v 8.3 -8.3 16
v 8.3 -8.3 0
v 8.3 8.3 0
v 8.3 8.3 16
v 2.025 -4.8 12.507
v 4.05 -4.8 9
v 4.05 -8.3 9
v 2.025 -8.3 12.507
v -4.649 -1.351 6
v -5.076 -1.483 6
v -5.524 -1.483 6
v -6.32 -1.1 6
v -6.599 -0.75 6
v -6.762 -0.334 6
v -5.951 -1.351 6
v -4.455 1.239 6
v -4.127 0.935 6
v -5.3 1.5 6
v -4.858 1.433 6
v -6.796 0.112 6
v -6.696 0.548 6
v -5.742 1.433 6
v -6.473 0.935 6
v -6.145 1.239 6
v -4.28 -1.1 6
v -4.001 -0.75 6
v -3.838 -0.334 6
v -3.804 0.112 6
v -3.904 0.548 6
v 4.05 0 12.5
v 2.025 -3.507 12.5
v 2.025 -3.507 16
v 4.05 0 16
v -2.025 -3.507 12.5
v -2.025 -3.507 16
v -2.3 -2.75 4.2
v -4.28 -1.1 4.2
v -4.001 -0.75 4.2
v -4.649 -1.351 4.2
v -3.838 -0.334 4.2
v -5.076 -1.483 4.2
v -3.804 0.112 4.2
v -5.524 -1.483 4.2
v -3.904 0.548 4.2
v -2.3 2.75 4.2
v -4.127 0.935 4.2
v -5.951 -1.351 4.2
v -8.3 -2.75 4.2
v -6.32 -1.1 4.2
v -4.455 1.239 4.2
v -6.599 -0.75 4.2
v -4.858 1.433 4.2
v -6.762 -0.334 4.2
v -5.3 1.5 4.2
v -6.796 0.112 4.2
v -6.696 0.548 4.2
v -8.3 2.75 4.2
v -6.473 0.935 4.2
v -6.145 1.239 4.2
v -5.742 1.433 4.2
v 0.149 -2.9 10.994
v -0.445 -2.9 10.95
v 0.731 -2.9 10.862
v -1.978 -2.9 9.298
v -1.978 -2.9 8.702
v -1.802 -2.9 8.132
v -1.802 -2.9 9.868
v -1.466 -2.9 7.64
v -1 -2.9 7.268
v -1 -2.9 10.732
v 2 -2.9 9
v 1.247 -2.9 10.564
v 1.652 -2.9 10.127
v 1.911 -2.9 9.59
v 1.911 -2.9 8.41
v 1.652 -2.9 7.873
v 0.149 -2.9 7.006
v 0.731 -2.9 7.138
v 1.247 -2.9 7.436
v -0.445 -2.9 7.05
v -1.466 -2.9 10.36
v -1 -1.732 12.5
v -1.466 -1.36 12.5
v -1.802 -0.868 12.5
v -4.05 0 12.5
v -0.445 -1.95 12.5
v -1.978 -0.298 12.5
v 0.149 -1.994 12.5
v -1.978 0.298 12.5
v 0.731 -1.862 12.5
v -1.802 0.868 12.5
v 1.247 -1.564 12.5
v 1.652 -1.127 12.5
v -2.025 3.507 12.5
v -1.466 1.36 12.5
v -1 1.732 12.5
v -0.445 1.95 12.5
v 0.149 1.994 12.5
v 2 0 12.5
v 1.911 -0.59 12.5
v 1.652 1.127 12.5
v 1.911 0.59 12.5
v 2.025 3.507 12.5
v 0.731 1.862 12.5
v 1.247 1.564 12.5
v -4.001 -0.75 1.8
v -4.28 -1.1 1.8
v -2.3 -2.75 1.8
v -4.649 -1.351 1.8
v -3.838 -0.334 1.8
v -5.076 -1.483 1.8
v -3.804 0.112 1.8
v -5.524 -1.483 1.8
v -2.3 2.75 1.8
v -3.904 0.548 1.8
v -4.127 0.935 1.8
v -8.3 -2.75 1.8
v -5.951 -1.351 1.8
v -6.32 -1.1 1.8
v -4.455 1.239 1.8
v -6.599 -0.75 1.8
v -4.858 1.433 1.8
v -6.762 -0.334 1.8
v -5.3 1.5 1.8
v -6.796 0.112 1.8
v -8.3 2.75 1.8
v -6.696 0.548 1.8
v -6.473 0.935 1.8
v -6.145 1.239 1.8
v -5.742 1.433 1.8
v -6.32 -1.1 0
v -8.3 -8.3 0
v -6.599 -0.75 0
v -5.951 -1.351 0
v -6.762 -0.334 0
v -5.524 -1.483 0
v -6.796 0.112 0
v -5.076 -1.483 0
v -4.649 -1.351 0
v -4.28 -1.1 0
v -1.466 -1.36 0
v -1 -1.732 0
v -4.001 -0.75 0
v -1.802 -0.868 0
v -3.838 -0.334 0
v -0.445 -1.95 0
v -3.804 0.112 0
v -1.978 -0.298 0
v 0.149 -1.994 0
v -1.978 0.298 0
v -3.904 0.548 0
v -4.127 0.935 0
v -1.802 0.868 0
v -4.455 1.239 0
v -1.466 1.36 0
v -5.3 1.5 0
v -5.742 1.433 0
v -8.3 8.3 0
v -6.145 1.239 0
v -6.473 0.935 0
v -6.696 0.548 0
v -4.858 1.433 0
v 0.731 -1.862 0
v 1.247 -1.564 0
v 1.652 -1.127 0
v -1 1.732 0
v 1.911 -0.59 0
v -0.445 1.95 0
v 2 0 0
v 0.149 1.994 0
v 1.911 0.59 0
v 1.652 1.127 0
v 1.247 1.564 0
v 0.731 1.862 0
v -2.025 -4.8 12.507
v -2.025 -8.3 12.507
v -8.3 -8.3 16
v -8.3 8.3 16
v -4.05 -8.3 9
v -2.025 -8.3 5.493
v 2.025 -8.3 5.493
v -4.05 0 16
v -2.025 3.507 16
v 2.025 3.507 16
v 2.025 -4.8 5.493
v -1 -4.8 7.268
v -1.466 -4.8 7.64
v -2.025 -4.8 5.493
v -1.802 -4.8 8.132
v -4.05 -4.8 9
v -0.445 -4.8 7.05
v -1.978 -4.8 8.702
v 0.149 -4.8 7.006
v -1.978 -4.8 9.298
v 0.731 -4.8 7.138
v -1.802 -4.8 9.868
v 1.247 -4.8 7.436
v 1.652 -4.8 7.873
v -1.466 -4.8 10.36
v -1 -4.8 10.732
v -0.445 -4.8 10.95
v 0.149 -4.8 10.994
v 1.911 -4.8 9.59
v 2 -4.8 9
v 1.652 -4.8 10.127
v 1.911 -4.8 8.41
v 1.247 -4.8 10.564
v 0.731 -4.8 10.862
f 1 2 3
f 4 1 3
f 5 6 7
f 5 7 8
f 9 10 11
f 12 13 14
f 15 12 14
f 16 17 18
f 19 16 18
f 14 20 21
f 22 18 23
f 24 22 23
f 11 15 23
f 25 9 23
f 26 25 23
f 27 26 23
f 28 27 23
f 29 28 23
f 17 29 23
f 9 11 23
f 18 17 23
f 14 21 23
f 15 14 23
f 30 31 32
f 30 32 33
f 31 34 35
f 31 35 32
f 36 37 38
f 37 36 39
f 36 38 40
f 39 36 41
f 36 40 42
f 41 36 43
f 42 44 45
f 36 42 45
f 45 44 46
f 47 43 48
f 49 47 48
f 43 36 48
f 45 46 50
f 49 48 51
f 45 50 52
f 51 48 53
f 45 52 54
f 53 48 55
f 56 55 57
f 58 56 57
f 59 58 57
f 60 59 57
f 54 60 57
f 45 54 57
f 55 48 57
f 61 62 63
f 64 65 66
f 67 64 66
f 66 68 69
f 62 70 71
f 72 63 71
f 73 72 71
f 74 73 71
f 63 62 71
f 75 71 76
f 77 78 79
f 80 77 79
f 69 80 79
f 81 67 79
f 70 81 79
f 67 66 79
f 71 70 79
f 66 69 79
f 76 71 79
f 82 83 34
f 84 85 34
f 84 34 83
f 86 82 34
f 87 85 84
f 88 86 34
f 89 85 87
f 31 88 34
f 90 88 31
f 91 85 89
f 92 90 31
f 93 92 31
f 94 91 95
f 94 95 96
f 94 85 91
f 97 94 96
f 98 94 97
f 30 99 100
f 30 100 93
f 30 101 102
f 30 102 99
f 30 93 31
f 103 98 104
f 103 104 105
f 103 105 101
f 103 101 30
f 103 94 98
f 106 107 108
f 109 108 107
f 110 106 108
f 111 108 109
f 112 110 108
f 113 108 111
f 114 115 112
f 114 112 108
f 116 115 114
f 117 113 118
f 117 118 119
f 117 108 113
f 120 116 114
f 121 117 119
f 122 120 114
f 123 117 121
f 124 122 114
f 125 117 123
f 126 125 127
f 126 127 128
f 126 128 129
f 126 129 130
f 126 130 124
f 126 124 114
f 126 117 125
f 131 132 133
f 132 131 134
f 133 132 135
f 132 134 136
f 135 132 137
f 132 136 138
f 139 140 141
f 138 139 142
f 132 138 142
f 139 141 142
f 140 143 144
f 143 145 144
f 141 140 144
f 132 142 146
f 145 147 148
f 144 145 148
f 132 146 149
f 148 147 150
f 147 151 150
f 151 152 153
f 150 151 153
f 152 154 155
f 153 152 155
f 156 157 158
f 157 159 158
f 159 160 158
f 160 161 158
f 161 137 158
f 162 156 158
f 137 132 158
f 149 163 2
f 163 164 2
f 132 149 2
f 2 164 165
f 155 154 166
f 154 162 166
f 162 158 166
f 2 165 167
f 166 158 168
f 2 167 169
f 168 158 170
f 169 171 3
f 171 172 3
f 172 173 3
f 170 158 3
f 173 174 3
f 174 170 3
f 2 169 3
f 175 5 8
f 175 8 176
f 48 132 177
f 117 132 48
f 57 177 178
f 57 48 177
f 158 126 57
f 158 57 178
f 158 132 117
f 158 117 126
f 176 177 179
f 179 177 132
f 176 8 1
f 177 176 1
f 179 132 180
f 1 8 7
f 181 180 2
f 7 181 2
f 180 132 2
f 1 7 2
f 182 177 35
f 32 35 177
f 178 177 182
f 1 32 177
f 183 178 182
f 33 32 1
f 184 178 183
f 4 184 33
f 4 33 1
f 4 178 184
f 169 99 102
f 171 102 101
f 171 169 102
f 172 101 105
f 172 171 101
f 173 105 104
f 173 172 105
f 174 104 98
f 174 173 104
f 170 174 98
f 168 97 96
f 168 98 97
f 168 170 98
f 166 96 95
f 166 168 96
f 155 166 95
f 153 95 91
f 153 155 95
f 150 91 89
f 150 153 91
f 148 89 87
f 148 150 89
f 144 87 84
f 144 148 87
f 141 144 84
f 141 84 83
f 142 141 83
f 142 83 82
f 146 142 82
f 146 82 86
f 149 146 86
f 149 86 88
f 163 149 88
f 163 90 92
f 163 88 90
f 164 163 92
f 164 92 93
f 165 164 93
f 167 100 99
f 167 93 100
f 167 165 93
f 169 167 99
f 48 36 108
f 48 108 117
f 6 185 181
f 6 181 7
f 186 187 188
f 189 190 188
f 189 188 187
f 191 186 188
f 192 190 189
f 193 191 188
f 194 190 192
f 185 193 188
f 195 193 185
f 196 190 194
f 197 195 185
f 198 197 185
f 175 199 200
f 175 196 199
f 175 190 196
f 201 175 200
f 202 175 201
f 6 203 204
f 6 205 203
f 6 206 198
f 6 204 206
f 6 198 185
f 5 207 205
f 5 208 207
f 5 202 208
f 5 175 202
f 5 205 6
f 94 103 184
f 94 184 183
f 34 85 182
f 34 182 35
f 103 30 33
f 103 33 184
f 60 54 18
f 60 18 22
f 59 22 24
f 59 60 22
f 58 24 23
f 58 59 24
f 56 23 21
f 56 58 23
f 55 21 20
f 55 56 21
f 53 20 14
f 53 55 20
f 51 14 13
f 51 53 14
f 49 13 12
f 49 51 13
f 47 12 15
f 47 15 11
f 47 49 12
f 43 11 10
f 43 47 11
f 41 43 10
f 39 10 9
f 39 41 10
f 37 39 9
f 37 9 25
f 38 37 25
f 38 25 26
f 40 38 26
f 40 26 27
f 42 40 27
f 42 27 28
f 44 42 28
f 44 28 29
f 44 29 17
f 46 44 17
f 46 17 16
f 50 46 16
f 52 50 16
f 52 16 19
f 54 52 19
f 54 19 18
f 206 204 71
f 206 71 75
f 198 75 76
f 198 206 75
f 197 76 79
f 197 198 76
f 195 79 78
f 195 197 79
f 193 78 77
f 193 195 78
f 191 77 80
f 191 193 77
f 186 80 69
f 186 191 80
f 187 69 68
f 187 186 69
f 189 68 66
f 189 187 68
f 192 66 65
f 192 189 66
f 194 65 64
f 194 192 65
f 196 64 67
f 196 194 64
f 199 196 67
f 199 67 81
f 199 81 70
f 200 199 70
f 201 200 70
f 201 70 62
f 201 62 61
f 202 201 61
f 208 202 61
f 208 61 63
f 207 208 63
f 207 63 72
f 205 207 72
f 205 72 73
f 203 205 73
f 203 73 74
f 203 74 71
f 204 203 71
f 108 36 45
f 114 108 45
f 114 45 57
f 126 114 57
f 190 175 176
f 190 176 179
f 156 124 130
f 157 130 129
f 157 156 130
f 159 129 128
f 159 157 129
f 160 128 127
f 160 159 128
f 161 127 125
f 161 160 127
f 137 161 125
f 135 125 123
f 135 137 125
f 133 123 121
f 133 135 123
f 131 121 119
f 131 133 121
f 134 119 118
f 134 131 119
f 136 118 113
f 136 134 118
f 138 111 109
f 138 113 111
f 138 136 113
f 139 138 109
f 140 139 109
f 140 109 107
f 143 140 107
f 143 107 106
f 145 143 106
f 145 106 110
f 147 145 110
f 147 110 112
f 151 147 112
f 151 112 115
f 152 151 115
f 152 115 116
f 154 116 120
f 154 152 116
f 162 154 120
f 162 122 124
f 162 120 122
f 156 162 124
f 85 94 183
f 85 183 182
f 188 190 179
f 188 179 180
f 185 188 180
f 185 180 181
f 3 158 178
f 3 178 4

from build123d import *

# Parameters (mm, degrees)
CYLINDER002_R           = 1.5
CYLINDER002_DEPTH       = 6
SKETCH003_W             = 5.5
SKETCH003_H             = 6
PAD003_DEPTH            = 1.2
FUSION_PLACEMENT_ANGLE  = 90
PAD002_DEPTH            = 3.5
BODY002_PLACEMENT_ANGLE = 90
PAD001_DEPTH            = 3.5
CYLINDER_R              = 2
CYLINDER_DEPTH          = 16
CYLINDER001_R           = 2
CYLINDER001_DEPTH       = 5.4
BOX_W                   = 16.6
BOX_H                   = 16.6
BOX_DEPTH               = 16


with BuildPart() as cylinder002:
    # Cylinder002 → Cylinder002 (new body)
    with BuildSketch(Plane(origin=(0, 3, -3), x_dir=(1, 0, 0), z_dir=(0, 0, 1))):
        Circle(CYLINDER002_R)
    extrude(amount=CYLINDER002_DEPTH)


with BuildPart() as fusion:
    # Sketch003 → Pad003 (new body, symmetric)
    with BuildSketch(Plane.XY):
        with Locations((0, 3)):
            Rectangle(SKETCH003_W, SKETCH003_H)
    extrude(amount=PAD003_DEPTH, both=True)

    # Fusion: union Cylinder002
    add(cylinder002.part)


with BuildPart() as fusion_1:
    # Fusion placement: moved
    add(fusion.part.moved(Location((-2.3, 0, 3))).rotate(Axis((-2.3, 0, 3), (0, 0, 1)), FUSION_PLACEMENT_ANGLE))


with BuildPart() as nut_body002:
    # Sketch002 → Pad002 (new body)
    with BuildSketch(Plane.XY):
        Polygon((-4.05, 0), (-2.025, -3.507403), (2.025, -3.507403), (4.05, 0), (2.025, 3.507403), (-2.025, 3.507403), align=None)
    extrude(amount=PAD002_DEPTH)


with BuildPart() as nut_body002_1:
    # Body002 placement: moved
    add(nut_body002.part.moved(Location((0, -4.8, 9))).rotate(Axis((0, -4.8, 9), (1, 0, 0)), BODY002_PLACEMENT_ANGLE))


with BuildPart() as nut_body:
    # Sketch001 → Pad001 (new body)
    with BuildSketch(Plane.XY):
        Polygon((-4.05, 0), (-2.025, -3.507403), (2.025, -3.507403), (4.05, 0), (2.025, 3.507403), (-2.025, 3.507403), align=None)
    extrude(amount=PAD001_DEPTH)


with BuildPart() as nut_body_1:
    # Body001 placement: moved
    add(nut_body.part.moved(Location((0, 0, 12.5))))


with BuildPart() as cylinder:
    # Cylinder → Cylinder (new body)
    with BuildSketch(Plane.XY):
        Circle(CYLINDER_R)
    extrude(amount=CYLINDER_DEPTH)


with BuildPart() as fusion001:
    # Cylinder001 → Cylinder001 (new body)
    with BuildSketch(Plane(origin=(0, -8.3, 9), x_dir=(1, 0, 0), z_dir=(0, 1, 0))):
        Circle(CYLINDER001_R)
    extrude(amount=CYLINDER001_DEPTH)

    # Fusion001: union Fusion, nut_body002, nut_body, Cylinder
    add(fusion_1.part)
    add(nut_body002_1.part)
    add(nut_body_1.part)
    add(cylinder.part)


with BuildPart() as cut:
    # Box → Box (new body)
    with BuildSketch(Plane(origin=(-8.3, -8.3, 0), x_dir=(1, 0, 0), z_dir=(0, 0, 1))):
        with Locations((8.3, 8.3)):
            Rectangle(BOX_W, BOX_H)
    extrude(amount=BOX_DEPTH)

    # Cut: cut Fusion001
    add(fusion001.part, mode=Mode.SUBTRACT)


solid = cut.part
